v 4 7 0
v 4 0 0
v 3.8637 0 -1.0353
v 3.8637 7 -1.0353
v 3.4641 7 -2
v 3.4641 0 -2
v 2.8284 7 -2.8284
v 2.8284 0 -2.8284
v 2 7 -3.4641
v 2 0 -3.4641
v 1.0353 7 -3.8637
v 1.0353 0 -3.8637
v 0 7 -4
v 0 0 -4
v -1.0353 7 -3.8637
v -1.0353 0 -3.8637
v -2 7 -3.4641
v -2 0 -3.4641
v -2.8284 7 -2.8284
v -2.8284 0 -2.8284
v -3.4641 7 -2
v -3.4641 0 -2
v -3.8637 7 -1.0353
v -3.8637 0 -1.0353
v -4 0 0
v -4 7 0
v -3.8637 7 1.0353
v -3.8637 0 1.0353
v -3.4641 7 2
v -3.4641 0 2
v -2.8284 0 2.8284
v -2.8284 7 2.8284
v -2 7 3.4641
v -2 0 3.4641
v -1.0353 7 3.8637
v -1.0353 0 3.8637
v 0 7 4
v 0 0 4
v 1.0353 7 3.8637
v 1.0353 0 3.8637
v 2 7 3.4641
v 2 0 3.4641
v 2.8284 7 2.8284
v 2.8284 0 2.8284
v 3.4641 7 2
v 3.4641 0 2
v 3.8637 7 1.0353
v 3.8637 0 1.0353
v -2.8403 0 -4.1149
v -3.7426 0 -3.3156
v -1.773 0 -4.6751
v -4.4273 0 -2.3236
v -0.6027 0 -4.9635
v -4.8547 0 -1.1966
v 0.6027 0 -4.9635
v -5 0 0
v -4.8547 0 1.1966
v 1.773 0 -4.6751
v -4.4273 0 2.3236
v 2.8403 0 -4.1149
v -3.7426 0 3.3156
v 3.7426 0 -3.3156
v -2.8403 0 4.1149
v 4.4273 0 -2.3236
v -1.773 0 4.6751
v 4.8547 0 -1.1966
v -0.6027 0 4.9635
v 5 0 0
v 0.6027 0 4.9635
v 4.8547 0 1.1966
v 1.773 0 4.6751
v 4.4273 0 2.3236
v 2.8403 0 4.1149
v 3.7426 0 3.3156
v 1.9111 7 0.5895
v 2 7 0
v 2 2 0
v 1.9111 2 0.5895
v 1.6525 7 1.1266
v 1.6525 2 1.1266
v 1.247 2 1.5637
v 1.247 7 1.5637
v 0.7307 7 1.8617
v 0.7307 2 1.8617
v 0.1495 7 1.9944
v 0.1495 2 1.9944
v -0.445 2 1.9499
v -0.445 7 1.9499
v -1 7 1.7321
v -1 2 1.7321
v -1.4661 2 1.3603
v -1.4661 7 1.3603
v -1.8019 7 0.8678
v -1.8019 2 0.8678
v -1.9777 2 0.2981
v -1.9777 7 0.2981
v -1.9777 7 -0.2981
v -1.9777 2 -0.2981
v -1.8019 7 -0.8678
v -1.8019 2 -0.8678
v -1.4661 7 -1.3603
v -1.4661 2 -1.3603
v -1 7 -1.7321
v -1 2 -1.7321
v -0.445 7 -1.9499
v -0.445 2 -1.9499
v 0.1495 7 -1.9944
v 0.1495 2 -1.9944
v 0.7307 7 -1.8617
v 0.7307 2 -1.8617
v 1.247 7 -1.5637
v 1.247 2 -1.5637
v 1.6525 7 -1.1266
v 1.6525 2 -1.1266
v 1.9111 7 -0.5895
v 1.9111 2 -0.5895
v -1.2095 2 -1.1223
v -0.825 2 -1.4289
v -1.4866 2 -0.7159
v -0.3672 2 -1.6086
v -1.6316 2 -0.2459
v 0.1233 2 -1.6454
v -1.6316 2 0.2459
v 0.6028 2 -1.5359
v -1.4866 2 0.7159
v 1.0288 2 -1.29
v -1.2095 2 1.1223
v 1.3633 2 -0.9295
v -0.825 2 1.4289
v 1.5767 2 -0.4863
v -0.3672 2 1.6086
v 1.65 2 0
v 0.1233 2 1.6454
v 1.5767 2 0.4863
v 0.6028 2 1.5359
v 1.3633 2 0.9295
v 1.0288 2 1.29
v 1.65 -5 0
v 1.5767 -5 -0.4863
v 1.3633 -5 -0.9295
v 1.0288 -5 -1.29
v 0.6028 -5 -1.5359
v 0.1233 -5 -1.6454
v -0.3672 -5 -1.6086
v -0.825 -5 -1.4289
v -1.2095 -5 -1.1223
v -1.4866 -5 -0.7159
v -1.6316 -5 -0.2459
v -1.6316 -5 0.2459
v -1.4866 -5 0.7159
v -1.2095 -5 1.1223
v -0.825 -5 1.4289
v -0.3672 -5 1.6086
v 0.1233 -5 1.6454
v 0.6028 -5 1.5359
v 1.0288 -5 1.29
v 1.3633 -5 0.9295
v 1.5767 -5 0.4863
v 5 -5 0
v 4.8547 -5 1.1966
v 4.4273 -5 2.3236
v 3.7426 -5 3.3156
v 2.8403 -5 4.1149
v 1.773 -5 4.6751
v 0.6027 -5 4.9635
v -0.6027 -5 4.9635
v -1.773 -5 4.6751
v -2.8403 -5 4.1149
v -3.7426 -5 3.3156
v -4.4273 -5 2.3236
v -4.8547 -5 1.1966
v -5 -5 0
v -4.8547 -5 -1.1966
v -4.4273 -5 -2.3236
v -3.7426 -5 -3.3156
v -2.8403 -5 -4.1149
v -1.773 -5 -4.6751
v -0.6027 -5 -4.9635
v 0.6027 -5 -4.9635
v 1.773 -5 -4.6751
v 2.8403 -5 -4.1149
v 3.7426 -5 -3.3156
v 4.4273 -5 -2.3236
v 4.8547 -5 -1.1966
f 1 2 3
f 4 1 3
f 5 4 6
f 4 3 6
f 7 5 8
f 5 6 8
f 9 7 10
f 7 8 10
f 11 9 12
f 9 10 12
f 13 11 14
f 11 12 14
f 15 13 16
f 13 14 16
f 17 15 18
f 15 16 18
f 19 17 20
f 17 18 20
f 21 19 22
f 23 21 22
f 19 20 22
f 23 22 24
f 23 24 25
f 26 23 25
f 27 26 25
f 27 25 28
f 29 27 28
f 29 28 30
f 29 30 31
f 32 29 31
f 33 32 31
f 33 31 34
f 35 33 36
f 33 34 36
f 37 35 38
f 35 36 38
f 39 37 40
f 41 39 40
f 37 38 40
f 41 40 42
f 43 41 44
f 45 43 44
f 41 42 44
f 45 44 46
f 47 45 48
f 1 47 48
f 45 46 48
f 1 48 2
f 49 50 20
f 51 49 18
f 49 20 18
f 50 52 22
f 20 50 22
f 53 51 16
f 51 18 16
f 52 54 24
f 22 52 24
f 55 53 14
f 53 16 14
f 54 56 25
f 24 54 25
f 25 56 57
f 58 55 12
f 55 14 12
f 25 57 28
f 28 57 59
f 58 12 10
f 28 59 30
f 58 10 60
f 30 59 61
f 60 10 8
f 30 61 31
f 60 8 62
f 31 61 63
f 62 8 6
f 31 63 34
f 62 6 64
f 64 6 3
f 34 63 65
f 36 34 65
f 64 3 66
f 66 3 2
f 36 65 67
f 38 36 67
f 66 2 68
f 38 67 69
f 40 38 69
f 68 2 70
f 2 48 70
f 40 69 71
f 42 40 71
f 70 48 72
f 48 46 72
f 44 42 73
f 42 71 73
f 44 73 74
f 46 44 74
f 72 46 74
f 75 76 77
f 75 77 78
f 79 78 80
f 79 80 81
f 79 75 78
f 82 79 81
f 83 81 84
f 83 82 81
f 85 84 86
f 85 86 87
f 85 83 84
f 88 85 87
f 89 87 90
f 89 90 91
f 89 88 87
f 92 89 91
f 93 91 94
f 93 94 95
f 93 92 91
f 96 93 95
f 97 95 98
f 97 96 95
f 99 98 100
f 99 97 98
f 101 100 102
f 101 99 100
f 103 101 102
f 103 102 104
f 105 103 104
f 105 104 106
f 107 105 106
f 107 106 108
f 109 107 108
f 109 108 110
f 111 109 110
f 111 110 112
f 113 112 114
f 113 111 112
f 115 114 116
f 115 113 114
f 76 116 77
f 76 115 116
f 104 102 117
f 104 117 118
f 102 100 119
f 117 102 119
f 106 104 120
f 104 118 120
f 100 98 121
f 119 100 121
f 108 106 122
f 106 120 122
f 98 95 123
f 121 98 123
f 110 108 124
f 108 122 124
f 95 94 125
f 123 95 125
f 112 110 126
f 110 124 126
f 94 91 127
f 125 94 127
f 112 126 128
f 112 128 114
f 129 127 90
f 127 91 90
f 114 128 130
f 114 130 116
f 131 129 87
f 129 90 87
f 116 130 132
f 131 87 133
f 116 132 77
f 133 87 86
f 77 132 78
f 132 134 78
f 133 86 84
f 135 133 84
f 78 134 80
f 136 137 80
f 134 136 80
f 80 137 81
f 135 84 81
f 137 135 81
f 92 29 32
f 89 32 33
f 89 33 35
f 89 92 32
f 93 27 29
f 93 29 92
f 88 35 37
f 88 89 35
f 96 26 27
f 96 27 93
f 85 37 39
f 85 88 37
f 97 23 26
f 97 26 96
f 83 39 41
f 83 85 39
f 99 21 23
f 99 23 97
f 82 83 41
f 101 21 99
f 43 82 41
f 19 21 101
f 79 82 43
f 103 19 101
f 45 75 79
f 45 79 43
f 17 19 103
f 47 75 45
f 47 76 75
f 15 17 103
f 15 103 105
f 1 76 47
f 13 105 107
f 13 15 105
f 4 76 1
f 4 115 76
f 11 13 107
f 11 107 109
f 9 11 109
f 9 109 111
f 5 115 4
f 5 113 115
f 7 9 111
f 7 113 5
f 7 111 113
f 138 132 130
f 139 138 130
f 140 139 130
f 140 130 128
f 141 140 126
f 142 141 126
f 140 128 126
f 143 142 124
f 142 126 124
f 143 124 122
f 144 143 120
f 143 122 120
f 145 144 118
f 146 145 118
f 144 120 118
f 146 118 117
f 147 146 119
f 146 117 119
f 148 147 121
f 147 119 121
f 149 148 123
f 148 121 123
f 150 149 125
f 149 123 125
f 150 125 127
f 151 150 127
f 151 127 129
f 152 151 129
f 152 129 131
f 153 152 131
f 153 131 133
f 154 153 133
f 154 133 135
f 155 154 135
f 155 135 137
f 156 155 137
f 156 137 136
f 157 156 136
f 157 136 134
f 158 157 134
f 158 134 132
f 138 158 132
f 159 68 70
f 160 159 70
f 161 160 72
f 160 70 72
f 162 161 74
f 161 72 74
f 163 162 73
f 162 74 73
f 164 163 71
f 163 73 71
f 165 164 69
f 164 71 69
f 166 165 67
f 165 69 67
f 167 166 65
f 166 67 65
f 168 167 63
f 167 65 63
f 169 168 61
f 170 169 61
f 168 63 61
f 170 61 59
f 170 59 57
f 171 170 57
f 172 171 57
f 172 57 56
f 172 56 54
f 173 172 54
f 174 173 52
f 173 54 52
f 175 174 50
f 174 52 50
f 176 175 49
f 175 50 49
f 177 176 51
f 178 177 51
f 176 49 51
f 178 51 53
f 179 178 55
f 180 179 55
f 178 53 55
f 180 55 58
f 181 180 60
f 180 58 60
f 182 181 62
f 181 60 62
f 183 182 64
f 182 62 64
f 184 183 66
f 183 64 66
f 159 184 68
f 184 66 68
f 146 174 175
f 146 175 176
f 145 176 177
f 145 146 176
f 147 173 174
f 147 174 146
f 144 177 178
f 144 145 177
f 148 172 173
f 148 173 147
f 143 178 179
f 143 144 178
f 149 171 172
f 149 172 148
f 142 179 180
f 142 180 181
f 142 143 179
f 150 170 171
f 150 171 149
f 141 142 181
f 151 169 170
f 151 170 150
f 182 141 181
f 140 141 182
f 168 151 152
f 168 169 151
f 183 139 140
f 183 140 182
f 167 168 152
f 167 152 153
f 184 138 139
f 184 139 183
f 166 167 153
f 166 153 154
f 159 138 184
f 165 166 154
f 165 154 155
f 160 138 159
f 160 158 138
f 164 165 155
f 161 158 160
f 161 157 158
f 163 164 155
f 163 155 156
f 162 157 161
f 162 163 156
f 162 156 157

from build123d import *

# Parameters (mm, degrees)
SKETCH2_R           = 4
BOSS_EXTRUDE1_DEPTH = 7
SKETCH3_R           = 5
BOSS_EXTRUDE2_DEPTH = 5
SKETCH4_R           = 1.65
CUT_EXTRUDE1_DEPTH  = 12
SKETCH5_R           = 2
CUT_EXTRUDE2_DEPTH  = 5


with BuildPart() as part:
    # Sketch2 → Boss-Extrude1 (new body)
    with BuildSketch(Plane(origin=(0, 0, 0), x_dir=(1, 0, 0), z_dir=(0, 1, 0))):
        Circle(SKETCH2_R)
    extrude(amount=BOSS_EXTRUDE1_DEPTH)

    # Sketch3 → Boss-Extrude2 (add)
    with BuildSketch(Plane.XZ):
        Circle(SKETCH3_R)
    extrude(amount=BOSS_EXTRUDE2_DEPTH)

    # Sketch4 → Cut-Extrude1 (cut)
    with BuildSketch(Plane(origin=(0, 7, 0), x_dir=(1, 0, 0), z_dir=(0, 1, 0))):
        Circle(SKETCH4_R)
    extrude(amount=-CUT_EXTRUDE1_DEPTH, mode=Mode.SUBTRACT)

    # Sketch5 → Cut-Extrude2 (cut)
    with BuildSketch(Plane.XZ.offset(-7)):
        Circle(SKETCH5_R)
    extrude(amount=CUT_EXTRUDE2_DEPTH, mode=Mode.SUBTRACT)


solid = part.part
